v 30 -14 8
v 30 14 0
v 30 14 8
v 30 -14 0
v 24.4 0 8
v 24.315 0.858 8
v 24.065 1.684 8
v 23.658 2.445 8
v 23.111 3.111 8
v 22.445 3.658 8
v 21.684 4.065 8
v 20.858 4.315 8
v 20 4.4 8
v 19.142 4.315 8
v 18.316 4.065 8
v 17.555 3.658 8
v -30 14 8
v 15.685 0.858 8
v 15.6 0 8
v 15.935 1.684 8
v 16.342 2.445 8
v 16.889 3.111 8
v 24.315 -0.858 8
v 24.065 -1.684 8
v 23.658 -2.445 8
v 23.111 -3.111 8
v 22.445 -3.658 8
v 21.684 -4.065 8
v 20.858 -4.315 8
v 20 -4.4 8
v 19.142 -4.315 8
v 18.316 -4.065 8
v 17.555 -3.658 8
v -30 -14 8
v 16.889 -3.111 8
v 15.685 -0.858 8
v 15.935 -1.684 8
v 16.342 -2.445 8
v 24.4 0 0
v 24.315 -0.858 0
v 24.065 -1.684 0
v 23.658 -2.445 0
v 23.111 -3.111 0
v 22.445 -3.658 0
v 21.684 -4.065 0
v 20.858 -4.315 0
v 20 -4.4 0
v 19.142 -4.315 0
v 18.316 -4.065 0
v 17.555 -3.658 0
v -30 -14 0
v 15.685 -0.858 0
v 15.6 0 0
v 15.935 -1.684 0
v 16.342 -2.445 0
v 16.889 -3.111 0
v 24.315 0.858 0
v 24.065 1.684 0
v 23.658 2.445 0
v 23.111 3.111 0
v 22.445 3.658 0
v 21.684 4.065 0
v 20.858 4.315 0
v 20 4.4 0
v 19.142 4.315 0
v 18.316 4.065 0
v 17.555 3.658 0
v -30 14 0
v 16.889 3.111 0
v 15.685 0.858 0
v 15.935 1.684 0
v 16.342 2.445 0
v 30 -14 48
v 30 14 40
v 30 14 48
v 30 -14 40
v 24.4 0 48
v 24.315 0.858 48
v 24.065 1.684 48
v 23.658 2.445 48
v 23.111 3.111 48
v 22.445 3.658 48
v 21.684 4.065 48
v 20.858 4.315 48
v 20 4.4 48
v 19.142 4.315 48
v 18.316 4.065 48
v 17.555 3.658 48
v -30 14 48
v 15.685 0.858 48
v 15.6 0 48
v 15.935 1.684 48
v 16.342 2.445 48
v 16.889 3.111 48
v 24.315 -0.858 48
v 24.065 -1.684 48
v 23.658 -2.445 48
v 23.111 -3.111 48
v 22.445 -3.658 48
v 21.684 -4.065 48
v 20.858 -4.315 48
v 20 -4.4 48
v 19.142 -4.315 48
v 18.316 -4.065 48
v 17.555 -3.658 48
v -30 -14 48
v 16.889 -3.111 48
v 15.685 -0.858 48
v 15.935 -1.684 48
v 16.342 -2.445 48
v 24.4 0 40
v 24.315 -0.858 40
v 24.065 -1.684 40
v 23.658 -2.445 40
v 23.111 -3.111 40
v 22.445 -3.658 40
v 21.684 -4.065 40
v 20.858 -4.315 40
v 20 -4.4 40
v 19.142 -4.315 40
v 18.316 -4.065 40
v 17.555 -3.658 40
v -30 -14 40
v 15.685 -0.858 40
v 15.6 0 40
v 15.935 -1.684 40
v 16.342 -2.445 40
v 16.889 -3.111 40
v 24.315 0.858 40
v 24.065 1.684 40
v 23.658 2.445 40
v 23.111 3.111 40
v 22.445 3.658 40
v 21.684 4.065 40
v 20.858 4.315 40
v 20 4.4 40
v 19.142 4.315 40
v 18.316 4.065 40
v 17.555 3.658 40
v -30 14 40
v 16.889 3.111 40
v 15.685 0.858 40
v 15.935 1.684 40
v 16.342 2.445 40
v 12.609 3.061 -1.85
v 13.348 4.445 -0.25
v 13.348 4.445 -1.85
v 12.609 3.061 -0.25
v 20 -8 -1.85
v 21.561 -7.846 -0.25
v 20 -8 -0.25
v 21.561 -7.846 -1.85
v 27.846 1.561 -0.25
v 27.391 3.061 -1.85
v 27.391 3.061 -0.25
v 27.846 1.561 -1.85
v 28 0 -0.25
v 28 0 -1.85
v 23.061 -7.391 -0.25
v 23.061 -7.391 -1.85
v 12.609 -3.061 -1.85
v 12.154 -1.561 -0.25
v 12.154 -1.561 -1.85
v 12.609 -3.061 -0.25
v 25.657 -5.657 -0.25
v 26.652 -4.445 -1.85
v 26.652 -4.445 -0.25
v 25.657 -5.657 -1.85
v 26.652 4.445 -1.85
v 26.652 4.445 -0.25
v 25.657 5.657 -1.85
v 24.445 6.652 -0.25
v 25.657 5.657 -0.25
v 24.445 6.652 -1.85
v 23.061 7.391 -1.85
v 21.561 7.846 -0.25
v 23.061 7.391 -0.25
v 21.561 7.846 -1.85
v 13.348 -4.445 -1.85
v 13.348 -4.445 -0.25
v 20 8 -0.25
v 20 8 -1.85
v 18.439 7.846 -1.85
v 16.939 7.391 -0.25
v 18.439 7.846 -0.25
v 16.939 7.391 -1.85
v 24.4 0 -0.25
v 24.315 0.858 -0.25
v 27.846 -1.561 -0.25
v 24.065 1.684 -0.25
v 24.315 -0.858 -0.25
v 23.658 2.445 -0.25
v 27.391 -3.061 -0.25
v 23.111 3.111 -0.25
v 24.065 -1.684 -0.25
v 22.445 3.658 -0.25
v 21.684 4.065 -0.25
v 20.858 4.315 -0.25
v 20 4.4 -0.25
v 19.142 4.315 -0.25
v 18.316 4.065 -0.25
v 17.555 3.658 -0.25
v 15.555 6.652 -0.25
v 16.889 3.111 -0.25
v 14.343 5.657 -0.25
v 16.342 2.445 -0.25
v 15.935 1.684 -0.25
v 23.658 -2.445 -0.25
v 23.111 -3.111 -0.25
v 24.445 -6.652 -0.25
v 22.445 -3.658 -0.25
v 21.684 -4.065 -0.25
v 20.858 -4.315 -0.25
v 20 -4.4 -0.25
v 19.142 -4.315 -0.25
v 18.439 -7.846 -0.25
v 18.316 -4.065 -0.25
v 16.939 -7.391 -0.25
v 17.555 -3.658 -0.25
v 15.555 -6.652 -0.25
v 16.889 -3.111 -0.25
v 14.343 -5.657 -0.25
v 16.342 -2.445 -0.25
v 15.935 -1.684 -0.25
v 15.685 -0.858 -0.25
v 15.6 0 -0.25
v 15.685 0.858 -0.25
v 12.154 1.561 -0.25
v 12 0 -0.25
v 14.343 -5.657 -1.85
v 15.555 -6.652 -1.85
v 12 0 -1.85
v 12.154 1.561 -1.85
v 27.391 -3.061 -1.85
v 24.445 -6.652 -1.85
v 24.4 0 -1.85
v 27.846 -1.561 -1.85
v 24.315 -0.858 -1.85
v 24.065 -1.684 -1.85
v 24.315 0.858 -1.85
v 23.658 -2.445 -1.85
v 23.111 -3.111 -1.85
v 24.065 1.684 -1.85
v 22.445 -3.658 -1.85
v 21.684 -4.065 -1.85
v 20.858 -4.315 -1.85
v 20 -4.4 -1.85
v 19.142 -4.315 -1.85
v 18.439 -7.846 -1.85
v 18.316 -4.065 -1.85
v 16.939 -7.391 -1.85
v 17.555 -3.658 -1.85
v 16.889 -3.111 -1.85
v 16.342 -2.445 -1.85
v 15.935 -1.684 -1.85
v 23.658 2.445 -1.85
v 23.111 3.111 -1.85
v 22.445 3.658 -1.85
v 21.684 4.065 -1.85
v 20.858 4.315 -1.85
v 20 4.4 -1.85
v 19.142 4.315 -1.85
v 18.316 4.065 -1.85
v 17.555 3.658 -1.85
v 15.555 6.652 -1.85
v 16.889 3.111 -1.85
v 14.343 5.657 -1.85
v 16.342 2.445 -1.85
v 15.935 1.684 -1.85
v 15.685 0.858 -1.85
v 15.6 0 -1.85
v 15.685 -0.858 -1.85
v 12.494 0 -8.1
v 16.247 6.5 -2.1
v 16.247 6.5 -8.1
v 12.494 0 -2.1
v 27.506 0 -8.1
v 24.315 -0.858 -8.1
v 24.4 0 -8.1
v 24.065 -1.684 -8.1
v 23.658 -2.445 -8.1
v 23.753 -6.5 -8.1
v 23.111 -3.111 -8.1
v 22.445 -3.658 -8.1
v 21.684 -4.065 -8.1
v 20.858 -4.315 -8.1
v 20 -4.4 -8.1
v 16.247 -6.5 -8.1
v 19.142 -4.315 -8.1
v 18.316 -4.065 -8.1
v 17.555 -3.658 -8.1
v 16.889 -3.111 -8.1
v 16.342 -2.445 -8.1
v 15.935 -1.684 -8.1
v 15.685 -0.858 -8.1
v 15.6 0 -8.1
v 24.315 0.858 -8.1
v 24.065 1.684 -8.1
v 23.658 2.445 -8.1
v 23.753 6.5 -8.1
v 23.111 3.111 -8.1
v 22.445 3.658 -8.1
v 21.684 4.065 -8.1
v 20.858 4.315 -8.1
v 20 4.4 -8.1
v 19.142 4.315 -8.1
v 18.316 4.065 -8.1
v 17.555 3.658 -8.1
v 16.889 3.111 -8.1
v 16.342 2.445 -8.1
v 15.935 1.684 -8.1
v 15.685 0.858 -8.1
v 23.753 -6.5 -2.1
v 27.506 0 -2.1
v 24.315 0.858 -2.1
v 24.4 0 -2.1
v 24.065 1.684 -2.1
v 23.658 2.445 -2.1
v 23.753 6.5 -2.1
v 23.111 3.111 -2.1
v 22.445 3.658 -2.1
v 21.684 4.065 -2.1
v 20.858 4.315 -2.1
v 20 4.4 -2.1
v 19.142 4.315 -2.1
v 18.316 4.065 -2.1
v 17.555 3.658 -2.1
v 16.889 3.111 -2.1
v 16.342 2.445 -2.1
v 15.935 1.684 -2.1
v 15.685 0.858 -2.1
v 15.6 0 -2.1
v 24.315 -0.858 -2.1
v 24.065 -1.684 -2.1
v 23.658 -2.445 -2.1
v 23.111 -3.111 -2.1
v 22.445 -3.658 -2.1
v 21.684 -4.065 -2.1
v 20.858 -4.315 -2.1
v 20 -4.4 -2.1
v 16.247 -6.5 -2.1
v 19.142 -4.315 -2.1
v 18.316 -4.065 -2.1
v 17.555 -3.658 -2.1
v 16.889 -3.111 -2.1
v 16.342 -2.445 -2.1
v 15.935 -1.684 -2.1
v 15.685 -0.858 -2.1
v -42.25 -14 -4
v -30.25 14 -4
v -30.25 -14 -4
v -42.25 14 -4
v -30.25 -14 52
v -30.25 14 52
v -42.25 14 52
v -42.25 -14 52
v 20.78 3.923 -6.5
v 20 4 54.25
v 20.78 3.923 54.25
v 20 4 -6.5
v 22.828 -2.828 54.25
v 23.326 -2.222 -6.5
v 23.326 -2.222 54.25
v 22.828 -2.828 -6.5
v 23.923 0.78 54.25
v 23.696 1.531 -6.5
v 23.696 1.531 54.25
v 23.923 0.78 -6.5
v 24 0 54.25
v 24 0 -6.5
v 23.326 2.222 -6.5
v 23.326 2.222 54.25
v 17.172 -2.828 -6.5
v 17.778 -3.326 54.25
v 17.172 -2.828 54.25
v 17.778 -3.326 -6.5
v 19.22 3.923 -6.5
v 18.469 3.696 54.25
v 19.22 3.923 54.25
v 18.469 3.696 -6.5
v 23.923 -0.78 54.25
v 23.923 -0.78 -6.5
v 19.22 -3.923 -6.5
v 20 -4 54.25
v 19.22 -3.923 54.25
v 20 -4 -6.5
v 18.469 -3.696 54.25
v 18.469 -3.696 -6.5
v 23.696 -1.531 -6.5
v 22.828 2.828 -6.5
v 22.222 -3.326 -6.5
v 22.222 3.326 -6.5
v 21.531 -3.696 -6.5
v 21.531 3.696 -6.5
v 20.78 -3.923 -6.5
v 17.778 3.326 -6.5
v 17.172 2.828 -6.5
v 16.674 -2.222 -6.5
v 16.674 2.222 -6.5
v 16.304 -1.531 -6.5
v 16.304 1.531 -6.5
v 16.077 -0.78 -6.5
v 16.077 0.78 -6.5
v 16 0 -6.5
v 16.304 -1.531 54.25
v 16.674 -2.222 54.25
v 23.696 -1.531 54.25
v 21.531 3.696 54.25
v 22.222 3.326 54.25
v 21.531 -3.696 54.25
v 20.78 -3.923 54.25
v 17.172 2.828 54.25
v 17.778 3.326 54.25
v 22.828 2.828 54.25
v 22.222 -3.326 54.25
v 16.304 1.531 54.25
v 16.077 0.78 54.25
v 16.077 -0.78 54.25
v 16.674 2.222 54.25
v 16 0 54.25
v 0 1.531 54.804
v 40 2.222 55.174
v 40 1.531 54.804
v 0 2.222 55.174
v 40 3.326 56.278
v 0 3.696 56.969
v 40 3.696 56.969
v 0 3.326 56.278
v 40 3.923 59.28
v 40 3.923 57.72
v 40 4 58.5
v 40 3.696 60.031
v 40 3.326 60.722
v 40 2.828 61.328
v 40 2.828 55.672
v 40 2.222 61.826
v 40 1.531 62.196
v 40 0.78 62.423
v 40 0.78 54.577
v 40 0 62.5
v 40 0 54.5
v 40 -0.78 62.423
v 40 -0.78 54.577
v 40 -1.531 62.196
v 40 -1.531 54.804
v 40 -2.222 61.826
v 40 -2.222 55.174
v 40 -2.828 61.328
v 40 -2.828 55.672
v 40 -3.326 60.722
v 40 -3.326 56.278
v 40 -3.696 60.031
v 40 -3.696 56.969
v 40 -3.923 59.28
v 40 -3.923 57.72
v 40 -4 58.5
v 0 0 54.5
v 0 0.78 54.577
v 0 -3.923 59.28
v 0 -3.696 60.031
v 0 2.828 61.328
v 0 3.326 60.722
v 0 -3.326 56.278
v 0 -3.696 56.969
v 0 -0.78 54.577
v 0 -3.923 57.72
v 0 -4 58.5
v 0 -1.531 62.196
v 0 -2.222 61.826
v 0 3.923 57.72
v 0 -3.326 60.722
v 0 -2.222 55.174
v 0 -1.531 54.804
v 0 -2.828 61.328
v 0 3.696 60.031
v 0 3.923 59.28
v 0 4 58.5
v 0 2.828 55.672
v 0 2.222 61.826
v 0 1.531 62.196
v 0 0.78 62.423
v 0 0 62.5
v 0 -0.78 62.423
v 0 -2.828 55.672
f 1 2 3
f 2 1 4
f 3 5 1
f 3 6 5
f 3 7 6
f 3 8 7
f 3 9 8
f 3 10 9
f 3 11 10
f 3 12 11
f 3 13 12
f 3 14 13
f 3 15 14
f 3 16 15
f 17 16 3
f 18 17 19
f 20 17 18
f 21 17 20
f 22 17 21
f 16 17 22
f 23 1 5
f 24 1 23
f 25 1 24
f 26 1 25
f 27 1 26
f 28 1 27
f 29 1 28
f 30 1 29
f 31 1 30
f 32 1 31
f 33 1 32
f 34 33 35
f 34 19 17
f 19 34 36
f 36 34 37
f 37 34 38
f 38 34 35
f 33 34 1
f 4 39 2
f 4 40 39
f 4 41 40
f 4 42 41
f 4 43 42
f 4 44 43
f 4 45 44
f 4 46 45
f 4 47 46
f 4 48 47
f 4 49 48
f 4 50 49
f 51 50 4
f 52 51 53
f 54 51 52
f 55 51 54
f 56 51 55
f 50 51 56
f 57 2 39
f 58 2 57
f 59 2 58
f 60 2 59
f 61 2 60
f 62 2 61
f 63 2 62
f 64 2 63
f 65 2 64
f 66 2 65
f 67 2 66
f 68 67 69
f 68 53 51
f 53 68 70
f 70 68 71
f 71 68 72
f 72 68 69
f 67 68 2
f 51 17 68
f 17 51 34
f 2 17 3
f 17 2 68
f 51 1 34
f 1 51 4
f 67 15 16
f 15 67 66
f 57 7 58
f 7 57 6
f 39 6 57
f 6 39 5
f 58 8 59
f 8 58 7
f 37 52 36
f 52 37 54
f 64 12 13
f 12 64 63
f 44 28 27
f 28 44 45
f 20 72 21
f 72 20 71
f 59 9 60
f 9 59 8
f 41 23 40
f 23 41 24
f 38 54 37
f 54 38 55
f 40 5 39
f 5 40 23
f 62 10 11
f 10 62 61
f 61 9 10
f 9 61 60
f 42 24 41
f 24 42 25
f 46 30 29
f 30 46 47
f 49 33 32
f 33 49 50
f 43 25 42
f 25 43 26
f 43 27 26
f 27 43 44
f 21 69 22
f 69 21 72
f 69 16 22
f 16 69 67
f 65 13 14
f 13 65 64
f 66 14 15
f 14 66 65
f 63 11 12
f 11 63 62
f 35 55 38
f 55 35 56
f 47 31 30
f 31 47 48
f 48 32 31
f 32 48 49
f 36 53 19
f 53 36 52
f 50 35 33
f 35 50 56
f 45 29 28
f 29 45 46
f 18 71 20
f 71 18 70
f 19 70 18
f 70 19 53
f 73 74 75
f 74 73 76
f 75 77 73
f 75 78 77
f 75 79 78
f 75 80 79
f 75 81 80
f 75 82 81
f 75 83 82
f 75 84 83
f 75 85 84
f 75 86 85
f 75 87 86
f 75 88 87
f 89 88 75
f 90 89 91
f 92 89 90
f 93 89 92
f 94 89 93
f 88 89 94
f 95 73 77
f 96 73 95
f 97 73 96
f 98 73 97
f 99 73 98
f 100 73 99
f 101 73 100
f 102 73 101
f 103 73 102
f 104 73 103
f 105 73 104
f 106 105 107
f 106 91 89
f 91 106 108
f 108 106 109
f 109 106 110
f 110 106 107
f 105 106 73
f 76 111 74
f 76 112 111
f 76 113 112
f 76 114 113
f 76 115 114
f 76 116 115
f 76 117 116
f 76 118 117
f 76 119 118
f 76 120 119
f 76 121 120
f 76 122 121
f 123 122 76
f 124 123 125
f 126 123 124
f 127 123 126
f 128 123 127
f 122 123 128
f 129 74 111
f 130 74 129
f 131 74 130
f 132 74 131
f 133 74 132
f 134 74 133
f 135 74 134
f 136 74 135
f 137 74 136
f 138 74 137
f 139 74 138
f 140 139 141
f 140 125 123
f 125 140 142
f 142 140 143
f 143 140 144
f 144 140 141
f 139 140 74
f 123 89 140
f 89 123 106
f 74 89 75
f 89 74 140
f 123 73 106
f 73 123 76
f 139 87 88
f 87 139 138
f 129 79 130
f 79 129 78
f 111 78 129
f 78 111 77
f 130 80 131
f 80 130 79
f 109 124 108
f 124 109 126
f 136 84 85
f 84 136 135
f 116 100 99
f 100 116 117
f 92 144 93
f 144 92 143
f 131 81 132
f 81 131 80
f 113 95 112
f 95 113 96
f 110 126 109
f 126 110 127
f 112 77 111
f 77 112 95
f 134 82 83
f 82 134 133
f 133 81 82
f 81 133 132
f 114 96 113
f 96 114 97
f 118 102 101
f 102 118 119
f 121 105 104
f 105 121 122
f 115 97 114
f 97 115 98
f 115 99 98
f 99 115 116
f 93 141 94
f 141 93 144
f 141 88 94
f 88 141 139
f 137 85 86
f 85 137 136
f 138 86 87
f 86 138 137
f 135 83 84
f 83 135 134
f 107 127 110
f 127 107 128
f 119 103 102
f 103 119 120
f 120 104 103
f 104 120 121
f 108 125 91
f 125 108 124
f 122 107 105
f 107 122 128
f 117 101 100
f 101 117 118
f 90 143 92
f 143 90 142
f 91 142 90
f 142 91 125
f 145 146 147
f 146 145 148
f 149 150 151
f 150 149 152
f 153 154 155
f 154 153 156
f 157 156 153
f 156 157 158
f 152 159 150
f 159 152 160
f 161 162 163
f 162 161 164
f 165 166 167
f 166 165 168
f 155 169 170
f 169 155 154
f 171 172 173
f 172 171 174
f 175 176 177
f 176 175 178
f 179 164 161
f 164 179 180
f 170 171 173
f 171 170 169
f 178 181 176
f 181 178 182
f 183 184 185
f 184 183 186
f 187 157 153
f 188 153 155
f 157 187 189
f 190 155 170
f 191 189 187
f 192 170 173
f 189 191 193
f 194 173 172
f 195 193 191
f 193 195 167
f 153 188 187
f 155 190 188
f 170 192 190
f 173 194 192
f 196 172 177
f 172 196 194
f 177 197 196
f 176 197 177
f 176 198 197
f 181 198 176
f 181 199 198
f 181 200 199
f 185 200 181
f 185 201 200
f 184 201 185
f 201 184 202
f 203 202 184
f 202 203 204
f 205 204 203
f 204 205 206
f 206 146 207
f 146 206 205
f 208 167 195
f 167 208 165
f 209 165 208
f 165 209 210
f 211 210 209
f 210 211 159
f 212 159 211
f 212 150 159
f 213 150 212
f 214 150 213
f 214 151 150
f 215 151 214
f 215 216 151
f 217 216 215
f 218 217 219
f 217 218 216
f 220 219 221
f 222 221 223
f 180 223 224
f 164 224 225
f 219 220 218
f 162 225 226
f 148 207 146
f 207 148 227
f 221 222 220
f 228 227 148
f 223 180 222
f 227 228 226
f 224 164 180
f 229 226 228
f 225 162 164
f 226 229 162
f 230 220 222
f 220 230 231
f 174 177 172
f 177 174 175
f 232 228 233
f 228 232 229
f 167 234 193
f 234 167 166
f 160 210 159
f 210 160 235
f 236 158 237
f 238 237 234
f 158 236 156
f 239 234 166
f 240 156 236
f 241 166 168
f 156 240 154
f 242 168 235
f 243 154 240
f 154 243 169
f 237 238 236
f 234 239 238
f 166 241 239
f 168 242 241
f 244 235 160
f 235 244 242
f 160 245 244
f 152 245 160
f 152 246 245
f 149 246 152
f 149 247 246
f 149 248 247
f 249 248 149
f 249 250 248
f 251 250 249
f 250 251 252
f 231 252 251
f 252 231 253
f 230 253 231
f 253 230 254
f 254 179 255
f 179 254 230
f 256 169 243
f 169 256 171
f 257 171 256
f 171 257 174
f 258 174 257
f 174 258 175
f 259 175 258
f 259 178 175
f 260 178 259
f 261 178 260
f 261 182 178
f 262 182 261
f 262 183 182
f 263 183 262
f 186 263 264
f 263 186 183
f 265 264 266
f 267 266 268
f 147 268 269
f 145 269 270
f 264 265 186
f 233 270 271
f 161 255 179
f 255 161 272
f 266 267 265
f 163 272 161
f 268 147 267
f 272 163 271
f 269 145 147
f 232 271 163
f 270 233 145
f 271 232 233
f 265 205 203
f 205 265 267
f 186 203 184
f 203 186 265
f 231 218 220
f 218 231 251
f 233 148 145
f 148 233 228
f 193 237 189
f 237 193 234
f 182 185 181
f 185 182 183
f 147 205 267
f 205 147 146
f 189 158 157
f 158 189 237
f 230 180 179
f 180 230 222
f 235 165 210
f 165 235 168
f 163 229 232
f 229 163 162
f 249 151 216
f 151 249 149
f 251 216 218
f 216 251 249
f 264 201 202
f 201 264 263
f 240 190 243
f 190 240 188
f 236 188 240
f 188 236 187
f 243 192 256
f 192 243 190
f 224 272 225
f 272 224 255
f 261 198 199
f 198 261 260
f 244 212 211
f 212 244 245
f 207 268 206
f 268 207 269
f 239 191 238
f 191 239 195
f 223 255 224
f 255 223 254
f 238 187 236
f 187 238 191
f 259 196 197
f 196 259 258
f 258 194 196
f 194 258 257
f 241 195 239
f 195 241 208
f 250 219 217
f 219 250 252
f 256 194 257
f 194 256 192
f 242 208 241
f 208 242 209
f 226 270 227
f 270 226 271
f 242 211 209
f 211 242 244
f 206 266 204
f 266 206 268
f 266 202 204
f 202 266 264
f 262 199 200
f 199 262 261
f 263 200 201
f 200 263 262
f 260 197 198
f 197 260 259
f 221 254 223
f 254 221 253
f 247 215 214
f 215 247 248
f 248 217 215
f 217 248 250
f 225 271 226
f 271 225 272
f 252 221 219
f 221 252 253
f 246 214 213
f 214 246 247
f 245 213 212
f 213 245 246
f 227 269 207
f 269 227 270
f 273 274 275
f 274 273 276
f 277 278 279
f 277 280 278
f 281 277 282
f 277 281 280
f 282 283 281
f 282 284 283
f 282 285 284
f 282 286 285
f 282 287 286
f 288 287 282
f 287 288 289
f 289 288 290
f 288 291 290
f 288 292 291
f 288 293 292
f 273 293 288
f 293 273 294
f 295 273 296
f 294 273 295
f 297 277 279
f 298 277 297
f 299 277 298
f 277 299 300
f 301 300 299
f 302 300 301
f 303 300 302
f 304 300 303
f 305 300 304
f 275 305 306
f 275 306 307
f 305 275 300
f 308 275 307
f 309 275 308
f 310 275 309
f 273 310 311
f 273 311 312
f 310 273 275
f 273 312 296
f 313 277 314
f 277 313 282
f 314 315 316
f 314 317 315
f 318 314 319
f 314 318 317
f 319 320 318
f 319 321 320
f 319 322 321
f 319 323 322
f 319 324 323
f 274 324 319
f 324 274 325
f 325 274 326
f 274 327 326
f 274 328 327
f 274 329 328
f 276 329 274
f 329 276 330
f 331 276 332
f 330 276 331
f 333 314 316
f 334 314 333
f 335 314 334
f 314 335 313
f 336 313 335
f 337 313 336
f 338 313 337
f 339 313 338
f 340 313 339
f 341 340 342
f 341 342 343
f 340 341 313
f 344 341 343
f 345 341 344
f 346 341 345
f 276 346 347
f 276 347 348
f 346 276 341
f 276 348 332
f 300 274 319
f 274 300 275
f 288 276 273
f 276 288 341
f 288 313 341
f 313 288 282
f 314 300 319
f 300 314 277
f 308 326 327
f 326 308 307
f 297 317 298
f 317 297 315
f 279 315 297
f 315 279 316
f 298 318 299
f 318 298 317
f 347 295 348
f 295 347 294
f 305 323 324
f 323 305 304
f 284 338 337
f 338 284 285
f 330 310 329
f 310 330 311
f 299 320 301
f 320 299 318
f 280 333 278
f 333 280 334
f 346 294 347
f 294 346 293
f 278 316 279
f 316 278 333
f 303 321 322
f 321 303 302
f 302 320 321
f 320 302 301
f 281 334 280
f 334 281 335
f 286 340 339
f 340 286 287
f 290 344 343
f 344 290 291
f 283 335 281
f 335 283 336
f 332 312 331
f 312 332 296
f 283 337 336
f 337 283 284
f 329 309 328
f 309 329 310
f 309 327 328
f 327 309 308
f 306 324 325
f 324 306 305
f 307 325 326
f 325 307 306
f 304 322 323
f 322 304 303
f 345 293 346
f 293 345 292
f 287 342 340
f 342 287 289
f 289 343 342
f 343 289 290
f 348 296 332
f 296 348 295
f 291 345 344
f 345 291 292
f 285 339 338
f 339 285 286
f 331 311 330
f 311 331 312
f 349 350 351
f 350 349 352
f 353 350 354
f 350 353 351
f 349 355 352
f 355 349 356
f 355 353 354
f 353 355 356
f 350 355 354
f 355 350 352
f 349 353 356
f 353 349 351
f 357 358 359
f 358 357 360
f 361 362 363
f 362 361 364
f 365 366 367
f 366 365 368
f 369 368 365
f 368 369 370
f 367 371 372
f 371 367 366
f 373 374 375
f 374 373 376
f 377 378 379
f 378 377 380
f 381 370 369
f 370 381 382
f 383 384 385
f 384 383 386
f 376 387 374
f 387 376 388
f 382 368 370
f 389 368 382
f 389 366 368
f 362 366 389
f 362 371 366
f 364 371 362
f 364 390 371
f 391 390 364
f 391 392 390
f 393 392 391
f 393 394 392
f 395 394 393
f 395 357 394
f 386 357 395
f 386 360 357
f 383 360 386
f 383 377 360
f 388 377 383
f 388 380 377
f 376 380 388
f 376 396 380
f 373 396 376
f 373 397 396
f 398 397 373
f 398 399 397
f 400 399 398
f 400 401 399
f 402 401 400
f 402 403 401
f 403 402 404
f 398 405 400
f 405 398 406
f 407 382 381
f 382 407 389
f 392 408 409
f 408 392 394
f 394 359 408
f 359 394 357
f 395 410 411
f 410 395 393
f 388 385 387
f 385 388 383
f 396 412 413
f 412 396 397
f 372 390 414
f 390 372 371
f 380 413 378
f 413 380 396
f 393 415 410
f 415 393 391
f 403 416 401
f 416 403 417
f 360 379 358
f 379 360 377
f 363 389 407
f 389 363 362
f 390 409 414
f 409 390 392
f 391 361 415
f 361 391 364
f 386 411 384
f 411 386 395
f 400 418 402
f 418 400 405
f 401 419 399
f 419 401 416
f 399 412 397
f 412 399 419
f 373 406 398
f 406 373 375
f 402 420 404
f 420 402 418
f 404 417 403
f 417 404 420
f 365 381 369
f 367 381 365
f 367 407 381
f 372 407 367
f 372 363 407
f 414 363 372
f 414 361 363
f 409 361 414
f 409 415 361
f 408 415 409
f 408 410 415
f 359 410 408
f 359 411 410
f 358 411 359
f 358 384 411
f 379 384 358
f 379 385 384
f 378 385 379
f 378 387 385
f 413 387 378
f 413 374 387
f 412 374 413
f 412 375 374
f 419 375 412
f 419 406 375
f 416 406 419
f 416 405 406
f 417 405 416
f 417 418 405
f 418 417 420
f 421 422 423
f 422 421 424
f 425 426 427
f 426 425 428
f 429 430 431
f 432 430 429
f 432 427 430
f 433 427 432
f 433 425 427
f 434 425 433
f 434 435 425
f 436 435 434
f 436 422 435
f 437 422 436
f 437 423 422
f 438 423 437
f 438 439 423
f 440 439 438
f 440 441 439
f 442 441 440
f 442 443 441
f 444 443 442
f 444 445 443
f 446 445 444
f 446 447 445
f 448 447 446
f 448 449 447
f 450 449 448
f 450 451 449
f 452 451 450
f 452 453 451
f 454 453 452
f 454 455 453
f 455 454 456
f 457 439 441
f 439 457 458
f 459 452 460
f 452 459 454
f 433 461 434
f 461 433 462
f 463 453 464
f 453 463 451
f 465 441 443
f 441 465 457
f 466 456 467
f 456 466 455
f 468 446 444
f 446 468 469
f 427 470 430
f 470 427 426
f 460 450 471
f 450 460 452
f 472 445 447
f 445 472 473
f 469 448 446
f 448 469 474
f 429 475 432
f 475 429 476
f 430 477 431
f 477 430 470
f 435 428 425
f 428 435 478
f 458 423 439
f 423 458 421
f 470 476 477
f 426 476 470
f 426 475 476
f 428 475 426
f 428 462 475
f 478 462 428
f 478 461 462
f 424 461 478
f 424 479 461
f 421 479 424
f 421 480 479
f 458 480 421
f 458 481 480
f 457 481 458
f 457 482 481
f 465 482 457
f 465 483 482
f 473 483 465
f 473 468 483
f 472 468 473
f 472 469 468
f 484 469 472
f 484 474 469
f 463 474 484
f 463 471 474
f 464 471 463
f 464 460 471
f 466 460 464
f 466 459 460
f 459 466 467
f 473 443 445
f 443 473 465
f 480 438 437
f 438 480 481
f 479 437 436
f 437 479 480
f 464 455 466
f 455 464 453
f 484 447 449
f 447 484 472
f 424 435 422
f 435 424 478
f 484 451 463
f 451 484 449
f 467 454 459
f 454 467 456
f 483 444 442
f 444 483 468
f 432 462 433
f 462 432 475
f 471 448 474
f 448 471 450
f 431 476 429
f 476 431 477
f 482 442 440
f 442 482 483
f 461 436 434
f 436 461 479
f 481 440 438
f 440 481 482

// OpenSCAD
$fn = 32;

// ------------------------------------------------------------------------
// C clamp: throat 40 mm, screw d8
// Every part is its own module, assembly() places every instance.
// ------------------------------------------------------------------------

// --- part 1 ---
module clamp_arm() {
  difference() {
    translate([-30, -14, 0]) cube([60, 28, 8]);
    translate([20, 0, -1]) cylinder(h = 10, d = 8.8);
  }
}

// --- part 2 ---
module clamp_spine() {
  difference() {
    translate([-28, -14, 0]) cube([56, 28, 12]);
  }
}

// --- part 3 ---
module clamp_screw() {
  translate([0, 0, -30.375]) cylinder(h = 60.75, d = 8);
}

// --- part 4 ---
module clamp_washer() {
  difference() {
      translate([0, 0, 0]) cylinder(h = 1.6, d = 16);
      translate([0, 0, -1]) cylinder(h = 3.6, d = 8.8);
    }
}

// --- part 5 ---
module clamp_nut() {
  difference() {
    linear_extrude(height = 6) polygon(points = [[7.506, 0], [3.753, 6.5], [-3.753, 6.5], [-7.506, 0], [-3.753, -6.5], [3.753, -6.5]]);
    translate([0, 0, -1]) cylinder(h = 8, d = 8.8);
  }
}

// --- part 6 ---
module tommy_bar() {
  translate([0, 0, -20]) cylinder(h = 40, d = 8);
}

// --- assembly ---
module assembly() {
  color([0.80, 0.24, 0.20]) translate([0, 0, 0]) rotate([0, 0, 0]) clamp_arm();
  color([0.20, 0.45, 0.75]) translate([0, 0, 40]) rotate([0, 0, 0]) clamp_arm();
  color([0.25, 0.62, 0.32]) translate([-42.25, 0, 24]) rotate([0, 90, 0]) clamp_spine();
  color([0.92, 0.70, 0.18]) translate([20, 0, 23.875]) rotate([0, 0, 0]) clamp_screw();
  color([0.58, 0.35, 0.70]) translate([20, 0, -1.85]) rotate([0, 0, 0]) clamp_washer();
  color([0.16, 0.66, 0.66]) translate([20, 0, -8.1]) rotate([0, 0, 0]) clamp_nut();
  color([0.85, 0.48, 0.18]) translate([20, 0, 58.5]) rotate([0, 90, 0]) tommy_bar();
}

assembly();
